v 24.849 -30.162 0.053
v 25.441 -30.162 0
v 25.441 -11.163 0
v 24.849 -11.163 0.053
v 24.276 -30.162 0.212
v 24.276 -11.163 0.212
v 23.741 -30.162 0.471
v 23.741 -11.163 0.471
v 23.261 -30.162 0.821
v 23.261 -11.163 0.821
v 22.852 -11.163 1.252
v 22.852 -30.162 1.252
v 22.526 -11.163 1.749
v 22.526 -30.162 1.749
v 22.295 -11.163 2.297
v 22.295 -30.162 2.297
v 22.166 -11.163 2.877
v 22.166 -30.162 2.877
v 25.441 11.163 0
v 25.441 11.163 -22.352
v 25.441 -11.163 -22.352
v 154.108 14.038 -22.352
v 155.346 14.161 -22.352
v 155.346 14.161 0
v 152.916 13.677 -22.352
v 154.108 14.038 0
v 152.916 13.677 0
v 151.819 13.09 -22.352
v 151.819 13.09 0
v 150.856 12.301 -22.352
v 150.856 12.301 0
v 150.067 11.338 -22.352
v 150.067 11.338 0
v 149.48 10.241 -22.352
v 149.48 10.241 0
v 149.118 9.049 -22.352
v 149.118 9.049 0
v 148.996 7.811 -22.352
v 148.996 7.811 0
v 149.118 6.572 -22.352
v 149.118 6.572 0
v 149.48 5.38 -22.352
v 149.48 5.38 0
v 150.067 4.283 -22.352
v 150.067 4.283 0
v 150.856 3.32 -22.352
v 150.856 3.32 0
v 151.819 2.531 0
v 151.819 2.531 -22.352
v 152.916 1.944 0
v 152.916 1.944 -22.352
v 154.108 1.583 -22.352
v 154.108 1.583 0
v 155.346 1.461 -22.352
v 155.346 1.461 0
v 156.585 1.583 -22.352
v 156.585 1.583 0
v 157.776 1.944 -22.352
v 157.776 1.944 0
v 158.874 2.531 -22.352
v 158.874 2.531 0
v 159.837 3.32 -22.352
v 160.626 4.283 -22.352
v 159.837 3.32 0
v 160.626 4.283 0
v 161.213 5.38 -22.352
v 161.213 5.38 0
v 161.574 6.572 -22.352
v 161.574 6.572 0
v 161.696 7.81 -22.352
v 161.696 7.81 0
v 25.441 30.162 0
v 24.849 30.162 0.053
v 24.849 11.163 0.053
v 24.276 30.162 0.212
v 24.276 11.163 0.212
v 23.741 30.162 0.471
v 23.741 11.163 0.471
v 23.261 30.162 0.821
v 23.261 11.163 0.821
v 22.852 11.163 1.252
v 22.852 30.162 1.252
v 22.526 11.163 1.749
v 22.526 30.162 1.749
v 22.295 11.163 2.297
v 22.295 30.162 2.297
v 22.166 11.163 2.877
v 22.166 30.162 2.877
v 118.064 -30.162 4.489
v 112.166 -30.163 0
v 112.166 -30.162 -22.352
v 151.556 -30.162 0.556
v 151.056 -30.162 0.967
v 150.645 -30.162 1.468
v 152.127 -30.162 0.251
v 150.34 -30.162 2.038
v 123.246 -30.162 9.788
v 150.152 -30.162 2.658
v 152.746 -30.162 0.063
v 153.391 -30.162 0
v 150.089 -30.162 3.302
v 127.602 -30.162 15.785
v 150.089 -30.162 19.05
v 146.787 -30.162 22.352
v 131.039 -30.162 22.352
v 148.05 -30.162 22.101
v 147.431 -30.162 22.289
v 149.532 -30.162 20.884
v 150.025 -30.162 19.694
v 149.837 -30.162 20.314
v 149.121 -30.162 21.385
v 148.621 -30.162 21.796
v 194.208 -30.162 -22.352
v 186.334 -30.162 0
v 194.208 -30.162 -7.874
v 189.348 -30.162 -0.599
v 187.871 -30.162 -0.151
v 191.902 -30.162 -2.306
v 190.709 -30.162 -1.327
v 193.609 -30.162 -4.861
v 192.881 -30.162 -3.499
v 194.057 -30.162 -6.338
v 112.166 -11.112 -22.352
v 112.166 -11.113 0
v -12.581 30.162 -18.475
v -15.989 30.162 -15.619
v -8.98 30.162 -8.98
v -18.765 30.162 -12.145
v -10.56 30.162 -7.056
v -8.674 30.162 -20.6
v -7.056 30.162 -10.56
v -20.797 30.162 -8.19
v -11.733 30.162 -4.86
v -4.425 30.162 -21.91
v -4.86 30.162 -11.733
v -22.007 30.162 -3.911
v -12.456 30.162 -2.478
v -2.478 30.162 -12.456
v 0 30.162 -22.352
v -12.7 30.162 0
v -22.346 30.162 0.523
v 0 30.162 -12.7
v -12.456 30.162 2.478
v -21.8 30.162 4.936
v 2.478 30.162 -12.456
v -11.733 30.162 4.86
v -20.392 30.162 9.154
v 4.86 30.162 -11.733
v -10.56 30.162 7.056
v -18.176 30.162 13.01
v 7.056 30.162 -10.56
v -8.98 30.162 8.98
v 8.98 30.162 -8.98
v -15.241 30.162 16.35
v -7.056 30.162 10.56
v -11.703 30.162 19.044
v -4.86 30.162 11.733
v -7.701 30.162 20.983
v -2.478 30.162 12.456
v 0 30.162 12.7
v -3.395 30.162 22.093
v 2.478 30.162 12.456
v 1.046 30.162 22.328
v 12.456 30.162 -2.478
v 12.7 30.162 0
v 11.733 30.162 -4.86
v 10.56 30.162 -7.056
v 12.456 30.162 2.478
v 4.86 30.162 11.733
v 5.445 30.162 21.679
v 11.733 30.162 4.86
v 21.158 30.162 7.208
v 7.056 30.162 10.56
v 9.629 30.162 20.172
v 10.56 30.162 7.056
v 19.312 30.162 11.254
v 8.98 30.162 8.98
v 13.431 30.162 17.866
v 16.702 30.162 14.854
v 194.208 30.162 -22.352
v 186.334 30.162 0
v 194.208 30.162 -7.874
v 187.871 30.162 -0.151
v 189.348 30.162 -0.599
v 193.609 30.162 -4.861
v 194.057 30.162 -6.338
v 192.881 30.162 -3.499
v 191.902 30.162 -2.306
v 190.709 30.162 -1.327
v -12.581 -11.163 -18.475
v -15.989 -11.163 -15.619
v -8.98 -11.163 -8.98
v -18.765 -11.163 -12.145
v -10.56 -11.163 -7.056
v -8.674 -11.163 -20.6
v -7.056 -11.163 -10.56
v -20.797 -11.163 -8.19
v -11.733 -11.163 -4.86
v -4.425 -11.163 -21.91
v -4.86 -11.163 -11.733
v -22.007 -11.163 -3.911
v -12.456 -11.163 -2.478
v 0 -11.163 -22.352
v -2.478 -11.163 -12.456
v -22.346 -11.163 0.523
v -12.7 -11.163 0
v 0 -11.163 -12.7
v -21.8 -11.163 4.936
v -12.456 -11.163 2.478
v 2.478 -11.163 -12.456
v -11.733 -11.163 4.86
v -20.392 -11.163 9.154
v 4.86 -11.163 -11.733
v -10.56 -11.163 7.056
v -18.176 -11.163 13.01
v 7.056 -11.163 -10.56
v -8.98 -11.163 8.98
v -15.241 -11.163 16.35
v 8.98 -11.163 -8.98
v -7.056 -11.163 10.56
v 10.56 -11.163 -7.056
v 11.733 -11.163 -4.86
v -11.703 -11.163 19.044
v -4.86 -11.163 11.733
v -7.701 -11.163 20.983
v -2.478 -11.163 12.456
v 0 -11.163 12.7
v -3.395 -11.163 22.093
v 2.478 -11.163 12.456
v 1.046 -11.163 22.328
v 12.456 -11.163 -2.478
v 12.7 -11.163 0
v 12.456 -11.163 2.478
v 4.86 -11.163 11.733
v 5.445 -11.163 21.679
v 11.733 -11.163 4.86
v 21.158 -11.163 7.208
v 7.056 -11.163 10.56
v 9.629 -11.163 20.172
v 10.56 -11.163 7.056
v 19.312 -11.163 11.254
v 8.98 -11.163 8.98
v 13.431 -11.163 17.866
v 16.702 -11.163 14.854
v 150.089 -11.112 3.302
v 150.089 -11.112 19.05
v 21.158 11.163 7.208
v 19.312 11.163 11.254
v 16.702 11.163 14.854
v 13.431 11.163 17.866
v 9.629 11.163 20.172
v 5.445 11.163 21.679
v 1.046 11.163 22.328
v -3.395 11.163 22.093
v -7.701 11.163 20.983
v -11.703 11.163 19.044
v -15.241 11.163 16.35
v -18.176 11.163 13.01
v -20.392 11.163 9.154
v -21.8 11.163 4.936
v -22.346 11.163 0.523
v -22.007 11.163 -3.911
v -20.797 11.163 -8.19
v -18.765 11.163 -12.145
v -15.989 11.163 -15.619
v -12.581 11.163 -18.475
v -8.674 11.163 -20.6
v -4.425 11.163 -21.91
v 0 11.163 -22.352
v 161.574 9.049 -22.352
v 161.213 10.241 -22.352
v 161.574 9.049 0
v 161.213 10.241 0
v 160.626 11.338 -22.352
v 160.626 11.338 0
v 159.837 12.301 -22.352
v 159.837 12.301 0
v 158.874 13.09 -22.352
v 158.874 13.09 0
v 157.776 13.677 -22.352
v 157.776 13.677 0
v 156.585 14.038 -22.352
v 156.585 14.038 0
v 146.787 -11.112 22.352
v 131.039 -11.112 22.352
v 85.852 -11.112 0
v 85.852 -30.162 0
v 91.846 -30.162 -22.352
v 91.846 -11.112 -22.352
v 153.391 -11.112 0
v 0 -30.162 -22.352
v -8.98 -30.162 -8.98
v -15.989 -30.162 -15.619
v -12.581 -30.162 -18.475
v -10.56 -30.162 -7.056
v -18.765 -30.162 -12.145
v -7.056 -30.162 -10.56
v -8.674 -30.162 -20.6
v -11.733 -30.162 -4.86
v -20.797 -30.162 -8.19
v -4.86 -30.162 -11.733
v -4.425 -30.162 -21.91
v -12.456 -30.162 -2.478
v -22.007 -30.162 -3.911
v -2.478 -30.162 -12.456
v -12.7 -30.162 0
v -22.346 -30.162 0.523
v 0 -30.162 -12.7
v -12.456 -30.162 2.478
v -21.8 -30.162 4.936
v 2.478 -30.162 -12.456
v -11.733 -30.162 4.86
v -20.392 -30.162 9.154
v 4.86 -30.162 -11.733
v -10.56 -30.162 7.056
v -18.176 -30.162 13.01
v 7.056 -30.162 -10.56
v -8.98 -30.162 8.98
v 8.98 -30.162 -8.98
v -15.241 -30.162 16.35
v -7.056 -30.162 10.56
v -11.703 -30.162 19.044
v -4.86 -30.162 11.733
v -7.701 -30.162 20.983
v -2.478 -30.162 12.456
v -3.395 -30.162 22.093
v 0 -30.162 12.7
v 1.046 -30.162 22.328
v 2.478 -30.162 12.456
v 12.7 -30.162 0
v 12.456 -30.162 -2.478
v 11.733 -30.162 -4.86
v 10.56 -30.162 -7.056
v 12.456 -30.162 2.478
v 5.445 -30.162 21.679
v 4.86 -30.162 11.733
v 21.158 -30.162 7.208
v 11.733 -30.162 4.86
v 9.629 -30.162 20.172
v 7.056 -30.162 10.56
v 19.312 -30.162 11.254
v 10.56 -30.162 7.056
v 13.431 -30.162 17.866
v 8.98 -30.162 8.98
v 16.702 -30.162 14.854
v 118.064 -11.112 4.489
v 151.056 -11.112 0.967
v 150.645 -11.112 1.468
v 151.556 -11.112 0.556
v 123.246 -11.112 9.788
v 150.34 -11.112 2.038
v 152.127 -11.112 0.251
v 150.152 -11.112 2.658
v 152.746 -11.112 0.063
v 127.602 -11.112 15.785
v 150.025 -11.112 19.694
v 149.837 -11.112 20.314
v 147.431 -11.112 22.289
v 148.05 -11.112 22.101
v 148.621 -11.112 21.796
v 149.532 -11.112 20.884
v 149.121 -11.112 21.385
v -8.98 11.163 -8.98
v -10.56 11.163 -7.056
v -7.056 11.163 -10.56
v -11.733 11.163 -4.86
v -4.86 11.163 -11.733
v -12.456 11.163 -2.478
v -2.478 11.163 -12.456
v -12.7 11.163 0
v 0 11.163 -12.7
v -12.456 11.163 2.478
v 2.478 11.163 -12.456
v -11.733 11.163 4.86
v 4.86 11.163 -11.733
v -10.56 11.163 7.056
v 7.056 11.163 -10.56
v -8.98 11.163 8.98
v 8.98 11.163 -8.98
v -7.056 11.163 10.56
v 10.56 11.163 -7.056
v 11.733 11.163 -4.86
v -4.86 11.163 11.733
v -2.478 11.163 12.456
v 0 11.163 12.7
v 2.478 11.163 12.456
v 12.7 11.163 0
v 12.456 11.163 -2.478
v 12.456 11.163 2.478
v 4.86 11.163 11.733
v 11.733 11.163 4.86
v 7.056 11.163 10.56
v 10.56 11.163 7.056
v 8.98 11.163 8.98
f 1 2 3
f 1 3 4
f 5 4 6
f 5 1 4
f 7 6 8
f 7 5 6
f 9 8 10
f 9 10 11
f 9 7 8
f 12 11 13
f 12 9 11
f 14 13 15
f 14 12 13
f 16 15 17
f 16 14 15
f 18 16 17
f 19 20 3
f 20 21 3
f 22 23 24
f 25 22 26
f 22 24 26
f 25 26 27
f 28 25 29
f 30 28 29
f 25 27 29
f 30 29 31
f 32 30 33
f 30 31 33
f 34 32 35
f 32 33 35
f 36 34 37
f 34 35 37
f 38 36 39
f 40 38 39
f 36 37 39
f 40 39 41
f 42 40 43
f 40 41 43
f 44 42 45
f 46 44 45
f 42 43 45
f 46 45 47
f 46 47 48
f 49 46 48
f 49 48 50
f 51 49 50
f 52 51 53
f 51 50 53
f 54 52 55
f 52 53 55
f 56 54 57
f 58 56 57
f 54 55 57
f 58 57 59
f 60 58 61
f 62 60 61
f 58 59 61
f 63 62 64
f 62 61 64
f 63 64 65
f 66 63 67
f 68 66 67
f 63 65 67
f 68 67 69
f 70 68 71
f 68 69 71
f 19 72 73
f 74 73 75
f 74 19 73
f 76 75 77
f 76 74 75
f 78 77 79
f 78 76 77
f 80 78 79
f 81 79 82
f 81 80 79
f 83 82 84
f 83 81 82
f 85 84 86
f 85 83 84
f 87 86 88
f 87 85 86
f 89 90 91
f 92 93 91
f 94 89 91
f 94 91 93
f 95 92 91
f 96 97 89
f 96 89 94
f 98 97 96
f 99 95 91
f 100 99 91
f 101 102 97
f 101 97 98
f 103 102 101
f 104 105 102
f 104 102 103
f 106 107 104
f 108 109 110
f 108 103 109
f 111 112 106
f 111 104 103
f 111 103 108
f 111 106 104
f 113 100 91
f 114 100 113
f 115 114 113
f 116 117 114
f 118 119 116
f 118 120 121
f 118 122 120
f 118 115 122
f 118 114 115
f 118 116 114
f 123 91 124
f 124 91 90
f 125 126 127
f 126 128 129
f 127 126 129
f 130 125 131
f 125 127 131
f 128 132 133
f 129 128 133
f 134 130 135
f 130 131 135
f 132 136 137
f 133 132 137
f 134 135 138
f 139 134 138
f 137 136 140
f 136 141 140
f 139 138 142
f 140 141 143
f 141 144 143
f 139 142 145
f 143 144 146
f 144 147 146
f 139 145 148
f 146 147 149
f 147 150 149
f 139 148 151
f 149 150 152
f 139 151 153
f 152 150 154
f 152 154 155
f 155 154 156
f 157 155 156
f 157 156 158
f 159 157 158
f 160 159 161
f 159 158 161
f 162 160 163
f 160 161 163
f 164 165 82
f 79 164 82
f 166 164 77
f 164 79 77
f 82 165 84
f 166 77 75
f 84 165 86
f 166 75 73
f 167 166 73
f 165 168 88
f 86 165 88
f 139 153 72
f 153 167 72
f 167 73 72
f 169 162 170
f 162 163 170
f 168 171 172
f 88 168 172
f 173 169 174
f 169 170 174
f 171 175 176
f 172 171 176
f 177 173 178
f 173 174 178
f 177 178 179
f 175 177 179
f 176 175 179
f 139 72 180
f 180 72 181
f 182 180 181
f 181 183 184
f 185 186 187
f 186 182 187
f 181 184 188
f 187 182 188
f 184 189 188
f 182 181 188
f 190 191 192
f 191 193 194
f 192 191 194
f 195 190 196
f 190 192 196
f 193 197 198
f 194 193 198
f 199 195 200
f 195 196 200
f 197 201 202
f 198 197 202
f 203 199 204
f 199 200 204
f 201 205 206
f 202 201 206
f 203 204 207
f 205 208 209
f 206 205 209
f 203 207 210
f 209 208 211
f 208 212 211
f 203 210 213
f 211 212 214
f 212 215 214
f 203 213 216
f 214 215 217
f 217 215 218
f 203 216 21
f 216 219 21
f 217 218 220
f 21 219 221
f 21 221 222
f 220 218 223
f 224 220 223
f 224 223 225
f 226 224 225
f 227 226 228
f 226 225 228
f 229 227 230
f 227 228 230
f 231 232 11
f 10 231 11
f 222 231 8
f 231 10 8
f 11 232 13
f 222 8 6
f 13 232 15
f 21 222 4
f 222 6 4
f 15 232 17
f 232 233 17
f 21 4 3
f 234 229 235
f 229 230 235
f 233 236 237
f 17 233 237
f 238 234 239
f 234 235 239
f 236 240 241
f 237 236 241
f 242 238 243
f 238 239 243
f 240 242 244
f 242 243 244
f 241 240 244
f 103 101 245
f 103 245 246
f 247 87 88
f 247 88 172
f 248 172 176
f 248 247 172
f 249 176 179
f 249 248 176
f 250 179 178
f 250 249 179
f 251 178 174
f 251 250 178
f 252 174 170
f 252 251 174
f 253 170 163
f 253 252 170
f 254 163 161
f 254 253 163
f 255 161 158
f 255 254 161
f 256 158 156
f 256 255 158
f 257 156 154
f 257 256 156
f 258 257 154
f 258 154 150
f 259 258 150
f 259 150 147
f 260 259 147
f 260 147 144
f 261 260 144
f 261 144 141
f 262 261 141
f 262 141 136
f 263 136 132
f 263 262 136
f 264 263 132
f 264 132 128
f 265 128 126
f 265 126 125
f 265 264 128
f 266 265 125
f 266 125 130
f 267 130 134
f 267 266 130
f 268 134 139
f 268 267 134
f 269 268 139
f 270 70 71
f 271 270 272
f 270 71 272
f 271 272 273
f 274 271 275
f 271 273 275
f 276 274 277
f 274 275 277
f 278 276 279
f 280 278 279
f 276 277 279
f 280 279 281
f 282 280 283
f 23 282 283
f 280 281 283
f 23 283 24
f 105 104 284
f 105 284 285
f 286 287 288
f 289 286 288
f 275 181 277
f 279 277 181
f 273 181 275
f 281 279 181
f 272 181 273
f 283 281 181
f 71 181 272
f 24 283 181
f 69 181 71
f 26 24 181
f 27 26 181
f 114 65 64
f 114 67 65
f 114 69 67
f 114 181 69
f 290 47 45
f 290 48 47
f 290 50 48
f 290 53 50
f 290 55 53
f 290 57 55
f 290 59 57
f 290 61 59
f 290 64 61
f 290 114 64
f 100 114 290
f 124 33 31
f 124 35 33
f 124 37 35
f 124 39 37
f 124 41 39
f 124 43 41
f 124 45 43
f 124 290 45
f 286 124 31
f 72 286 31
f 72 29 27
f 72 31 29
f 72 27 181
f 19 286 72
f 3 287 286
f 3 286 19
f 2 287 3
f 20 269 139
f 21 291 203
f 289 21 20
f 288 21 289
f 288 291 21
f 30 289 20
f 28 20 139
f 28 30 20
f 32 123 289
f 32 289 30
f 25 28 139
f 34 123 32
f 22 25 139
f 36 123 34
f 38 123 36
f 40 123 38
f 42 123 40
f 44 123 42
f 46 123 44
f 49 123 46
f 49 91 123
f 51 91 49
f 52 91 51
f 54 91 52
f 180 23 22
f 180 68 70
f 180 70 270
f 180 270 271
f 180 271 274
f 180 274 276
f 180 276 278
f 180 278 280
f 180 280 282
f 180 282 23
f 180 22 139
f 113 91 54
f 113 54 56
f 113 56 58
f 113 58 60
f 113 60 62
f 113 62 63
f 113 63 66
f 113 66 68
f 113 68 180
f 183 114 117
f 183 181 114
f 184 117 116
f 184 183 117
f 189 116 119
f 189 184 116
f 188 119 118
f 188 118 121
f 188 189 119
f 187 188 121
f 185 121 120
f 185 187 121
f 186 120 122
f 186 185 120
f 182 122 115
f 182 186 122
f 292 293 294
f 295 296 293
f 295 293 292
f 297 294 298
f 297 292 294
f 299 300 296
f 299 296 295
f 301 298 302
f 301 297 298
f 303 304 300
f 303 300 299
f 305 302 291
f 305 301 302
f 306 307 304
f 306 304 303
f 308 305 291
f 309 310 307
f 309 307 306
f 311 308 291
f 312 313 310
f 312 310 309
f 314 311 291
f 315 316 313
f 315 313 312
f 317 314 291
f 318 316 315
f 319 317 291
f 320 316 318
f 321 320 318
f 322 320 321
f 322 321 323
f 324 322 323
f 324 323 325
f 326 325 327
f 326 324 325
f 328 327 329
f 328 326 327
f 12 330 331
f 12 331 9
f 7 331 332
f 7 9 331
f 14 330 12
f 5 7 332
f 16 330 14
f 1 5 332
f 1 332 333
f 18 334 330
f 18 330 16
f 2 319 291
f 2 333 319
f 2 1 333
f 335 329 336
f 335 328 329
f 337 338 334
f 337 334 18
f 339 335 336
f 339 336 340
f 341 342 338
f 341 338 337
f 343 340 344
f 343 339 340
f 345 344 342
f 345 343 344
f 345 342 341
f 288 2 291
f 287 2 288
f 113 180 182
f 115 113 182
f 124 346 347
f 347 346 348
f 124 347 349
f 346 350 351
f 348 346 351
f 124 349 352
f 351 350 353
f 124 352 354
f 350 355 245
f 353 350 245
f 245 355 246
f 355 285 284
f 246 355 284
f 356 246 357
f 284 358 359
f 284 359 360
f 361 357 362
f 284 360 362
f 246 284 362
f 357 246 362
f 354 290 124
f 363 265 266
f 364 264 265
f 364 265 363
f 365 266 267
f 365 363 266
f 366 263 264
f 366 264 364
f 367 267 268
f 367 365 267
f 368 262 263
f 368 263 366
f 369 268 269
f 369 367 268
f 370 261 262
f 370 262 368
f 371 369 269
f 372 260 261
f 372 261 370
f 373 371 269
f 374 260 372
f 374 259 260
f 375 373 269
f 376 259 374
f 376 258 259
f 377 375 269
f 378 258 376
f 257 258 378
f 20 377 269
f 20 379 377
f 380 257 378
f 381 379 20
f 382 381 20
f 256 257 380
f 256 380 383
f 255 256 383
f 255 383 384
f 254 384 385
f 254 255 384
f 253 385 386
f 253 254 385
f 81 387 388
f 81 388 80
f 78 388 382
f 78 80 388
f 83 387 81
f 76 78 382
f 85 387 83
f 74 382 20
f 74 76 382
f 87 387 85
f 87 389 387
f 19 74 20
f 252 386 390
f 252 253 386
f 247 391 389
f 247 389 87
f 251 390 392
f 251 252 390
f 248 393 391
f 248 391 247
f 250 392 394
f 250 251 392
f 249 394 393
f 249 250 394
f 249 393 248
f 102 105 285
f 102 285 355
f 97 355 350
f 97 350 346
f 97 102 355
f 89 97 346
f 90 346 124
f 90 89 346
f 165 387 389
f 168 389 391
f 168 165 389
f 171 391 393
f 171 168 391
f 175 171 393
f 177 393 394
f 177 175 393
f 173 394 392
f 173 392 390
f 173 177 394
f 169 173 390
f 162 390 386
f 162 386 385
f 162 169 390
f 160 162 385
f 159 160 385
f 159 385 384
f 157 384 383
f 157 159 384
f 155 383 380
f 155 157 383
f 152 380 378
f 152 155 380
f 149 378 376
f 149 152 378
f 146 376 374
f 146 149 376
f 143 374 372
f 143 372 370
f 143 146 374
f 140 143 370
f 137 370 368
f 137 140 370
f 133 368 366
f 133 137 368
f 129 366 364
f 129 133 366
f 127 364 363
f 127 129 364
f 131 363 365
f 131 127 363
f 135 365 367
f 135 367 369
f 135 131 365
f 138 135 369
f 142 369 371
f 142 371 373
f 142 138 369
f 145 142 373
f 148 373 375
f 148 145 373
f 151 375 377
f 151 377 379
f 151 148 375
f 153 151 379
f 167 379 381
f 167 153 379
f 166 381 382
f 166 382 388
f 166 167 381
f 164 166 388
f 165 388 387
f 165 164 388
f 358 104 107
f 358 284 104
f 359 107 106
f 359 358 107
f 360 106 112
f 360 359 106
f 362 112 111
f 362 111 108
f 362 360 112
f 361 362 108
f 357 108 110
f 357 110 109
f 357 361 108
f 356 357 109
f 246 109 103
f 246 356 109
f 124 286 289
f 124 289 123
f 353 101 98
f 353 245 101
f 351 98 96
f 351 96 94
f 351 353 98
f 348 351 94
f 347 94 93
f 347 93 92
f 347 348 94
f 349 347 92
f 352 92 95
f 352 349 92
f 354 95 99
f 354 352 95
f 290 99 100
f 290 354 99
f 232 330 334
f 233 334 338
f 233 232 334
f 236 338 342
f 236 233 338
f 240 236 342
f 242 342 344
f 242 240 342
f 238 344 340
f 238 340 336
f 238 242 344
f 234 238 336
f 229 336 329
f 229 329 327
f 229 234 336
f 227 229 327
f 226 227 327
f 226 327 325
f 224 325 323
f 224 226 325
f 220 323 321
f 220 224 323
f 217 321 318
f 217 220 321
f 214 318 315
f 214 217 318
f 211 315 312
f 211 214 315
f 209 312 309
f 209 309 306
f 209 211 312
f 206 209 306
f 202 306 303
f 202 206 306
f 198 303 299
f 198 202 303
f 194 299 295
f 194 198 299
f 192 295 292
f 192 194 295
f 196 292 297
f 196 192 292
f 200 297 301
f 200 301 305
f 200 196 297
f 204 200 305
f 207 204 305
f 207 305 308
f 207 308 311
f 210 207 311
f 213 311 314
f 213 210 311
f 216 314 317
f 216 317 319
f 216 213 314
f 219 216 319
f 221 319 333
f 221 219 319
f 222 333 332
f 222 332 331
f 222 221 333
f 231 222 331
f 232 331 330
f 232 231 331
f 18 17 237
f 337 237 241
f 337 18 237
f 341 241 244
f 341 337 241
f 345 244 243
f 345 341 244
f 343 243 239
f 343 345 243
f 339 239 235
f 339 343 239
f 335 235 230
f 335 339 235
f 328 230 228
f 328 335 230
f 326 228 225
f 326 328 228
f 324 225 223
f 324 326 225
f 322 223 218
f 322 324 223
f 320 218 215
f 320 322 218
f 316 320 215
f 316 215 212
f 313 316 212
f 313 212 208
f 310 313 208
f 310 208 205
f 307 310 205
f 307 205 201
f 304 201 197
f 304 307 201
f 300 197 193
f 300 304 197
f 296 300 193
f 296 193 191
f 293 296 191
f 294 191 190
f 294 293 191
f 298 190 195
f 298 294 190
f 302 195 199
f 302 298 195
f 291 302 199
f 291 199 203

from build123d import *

# Parameters (mm, degrees)
F0_R      = 12.7
F1_DEPTH  = 30.1625
F3_R      = 3.302
F4_R      = 7.874
F5_DEPTH  = 19.05
F6_DEPTH  = 19.05
F7_R      = 3.302
F8_R      = 12.7
F9_DEPTH  = 11.1633
F11_DEPTH = 22.352


with BuildPart() as f1:
    # F0 (on Front) → F1 (new body, symmetric)
    with BuildSketch(Plane.XZ):
        with BuildLine():
            Line((194.2084, 0), (22.352, 0))
            ThreePointArc((22.352, 0), (-15.805251, 15.805251), (0, -22.352))
            Line((0, -22.352), (194.2084, -22.352))
            Line((194.2084, -22.352), (194.2084, 0))
        make_face()
        Circle(F0_R, mode=Mode.SUBTRACT)
    extrude(amount=F1_DEPTH, both=True)

    # F3
    f3_edges = [f1.edges().sort_by_distance(p)[0] for p in [
        (22.352, 0, 0),
    ]]
    fillet(f3_edges, radius=F3_R)

    # F4
    f4_edges = [f1.edges().sort_by_distance(p)[0] for p in [
        (194.2084, 0, 0),
    ]]
    fillet(f4_edges, radius=F4_R)

    # F2 (on face) → F5 (cut)
    with BuildSketch(Plane.XZ.offset(30.1625)):
        Polygon((112.1664, 0), (85.852, 0), (91.8464, -22.352), (112.1664, -22.352), align=None)
    extrude(amount=-F5_DEPTH, mode=Mode.SUBTRACT)

    # F2 (on face) → F6 (join)
    with BuildSketch(Plane.XZ.offset(30.1625)):
        with BuildLine():
            ThreePointArc((131.0386, 22.352), (123.246252, 9.78815), (112.1664, 0))
            Line((112.1664, 0), (131.0386, 0))
            Line((131.0386, 0), (150.0886, 0))
            Line((150.0886, 0), (150.0886, 22.352))
            Line((150.0886, 22.352), (131.0386, 22.352))
        make_face()
    extrude(amount=-F6_DEPTH)

    # F7
    f7_edges = [f1.edges().sort_by_distance(p)[0] for p in [
        (150.0886, -20.6375, 0),
        (150.0886, -20.6375, 22.352),
    ]]
    fillet(f7_edges, radius=F7_R)

    # F8 (on Front) → F9 (cut, symmetric)
    with BuildSketch(Plane.XZ):
        with BuildLine():
            ThreePointArc((25.440608, 0), (23.261179, 0.821417), (22.166074, 2.87699))
            ThreePointArc((22.166074, 2.87699), (-16.791641, 14.753058), (0, -22.352))
            Line((0, -22.352), (25.440608, -22.352))
            Line((25.440608, -22.352), (25.440608, 0))
        make_face()
        Circle(F8_R, mode=Mode.SUBTRACT)
    extrude(amount=F9_DEPTH, both=True, mode=Mode.SUBTRACT)

    # F10 (on face) → F11 (cut)
    with BuildSketch(Plane.XY):
        with BuildLine():
            ThreePointArc((161.6964, 7.8105), (159.836528, 12.300628), (155.3464, 14.1605))
            ThreePointArc((155.3464, 14.1605), (150.856272, 3.320372), (161.6964, 7.8105))
        make_face()
    extrude(amount=-F11_DEPTH, mode=Mode.SUBTRACT)


solid = f1.part
